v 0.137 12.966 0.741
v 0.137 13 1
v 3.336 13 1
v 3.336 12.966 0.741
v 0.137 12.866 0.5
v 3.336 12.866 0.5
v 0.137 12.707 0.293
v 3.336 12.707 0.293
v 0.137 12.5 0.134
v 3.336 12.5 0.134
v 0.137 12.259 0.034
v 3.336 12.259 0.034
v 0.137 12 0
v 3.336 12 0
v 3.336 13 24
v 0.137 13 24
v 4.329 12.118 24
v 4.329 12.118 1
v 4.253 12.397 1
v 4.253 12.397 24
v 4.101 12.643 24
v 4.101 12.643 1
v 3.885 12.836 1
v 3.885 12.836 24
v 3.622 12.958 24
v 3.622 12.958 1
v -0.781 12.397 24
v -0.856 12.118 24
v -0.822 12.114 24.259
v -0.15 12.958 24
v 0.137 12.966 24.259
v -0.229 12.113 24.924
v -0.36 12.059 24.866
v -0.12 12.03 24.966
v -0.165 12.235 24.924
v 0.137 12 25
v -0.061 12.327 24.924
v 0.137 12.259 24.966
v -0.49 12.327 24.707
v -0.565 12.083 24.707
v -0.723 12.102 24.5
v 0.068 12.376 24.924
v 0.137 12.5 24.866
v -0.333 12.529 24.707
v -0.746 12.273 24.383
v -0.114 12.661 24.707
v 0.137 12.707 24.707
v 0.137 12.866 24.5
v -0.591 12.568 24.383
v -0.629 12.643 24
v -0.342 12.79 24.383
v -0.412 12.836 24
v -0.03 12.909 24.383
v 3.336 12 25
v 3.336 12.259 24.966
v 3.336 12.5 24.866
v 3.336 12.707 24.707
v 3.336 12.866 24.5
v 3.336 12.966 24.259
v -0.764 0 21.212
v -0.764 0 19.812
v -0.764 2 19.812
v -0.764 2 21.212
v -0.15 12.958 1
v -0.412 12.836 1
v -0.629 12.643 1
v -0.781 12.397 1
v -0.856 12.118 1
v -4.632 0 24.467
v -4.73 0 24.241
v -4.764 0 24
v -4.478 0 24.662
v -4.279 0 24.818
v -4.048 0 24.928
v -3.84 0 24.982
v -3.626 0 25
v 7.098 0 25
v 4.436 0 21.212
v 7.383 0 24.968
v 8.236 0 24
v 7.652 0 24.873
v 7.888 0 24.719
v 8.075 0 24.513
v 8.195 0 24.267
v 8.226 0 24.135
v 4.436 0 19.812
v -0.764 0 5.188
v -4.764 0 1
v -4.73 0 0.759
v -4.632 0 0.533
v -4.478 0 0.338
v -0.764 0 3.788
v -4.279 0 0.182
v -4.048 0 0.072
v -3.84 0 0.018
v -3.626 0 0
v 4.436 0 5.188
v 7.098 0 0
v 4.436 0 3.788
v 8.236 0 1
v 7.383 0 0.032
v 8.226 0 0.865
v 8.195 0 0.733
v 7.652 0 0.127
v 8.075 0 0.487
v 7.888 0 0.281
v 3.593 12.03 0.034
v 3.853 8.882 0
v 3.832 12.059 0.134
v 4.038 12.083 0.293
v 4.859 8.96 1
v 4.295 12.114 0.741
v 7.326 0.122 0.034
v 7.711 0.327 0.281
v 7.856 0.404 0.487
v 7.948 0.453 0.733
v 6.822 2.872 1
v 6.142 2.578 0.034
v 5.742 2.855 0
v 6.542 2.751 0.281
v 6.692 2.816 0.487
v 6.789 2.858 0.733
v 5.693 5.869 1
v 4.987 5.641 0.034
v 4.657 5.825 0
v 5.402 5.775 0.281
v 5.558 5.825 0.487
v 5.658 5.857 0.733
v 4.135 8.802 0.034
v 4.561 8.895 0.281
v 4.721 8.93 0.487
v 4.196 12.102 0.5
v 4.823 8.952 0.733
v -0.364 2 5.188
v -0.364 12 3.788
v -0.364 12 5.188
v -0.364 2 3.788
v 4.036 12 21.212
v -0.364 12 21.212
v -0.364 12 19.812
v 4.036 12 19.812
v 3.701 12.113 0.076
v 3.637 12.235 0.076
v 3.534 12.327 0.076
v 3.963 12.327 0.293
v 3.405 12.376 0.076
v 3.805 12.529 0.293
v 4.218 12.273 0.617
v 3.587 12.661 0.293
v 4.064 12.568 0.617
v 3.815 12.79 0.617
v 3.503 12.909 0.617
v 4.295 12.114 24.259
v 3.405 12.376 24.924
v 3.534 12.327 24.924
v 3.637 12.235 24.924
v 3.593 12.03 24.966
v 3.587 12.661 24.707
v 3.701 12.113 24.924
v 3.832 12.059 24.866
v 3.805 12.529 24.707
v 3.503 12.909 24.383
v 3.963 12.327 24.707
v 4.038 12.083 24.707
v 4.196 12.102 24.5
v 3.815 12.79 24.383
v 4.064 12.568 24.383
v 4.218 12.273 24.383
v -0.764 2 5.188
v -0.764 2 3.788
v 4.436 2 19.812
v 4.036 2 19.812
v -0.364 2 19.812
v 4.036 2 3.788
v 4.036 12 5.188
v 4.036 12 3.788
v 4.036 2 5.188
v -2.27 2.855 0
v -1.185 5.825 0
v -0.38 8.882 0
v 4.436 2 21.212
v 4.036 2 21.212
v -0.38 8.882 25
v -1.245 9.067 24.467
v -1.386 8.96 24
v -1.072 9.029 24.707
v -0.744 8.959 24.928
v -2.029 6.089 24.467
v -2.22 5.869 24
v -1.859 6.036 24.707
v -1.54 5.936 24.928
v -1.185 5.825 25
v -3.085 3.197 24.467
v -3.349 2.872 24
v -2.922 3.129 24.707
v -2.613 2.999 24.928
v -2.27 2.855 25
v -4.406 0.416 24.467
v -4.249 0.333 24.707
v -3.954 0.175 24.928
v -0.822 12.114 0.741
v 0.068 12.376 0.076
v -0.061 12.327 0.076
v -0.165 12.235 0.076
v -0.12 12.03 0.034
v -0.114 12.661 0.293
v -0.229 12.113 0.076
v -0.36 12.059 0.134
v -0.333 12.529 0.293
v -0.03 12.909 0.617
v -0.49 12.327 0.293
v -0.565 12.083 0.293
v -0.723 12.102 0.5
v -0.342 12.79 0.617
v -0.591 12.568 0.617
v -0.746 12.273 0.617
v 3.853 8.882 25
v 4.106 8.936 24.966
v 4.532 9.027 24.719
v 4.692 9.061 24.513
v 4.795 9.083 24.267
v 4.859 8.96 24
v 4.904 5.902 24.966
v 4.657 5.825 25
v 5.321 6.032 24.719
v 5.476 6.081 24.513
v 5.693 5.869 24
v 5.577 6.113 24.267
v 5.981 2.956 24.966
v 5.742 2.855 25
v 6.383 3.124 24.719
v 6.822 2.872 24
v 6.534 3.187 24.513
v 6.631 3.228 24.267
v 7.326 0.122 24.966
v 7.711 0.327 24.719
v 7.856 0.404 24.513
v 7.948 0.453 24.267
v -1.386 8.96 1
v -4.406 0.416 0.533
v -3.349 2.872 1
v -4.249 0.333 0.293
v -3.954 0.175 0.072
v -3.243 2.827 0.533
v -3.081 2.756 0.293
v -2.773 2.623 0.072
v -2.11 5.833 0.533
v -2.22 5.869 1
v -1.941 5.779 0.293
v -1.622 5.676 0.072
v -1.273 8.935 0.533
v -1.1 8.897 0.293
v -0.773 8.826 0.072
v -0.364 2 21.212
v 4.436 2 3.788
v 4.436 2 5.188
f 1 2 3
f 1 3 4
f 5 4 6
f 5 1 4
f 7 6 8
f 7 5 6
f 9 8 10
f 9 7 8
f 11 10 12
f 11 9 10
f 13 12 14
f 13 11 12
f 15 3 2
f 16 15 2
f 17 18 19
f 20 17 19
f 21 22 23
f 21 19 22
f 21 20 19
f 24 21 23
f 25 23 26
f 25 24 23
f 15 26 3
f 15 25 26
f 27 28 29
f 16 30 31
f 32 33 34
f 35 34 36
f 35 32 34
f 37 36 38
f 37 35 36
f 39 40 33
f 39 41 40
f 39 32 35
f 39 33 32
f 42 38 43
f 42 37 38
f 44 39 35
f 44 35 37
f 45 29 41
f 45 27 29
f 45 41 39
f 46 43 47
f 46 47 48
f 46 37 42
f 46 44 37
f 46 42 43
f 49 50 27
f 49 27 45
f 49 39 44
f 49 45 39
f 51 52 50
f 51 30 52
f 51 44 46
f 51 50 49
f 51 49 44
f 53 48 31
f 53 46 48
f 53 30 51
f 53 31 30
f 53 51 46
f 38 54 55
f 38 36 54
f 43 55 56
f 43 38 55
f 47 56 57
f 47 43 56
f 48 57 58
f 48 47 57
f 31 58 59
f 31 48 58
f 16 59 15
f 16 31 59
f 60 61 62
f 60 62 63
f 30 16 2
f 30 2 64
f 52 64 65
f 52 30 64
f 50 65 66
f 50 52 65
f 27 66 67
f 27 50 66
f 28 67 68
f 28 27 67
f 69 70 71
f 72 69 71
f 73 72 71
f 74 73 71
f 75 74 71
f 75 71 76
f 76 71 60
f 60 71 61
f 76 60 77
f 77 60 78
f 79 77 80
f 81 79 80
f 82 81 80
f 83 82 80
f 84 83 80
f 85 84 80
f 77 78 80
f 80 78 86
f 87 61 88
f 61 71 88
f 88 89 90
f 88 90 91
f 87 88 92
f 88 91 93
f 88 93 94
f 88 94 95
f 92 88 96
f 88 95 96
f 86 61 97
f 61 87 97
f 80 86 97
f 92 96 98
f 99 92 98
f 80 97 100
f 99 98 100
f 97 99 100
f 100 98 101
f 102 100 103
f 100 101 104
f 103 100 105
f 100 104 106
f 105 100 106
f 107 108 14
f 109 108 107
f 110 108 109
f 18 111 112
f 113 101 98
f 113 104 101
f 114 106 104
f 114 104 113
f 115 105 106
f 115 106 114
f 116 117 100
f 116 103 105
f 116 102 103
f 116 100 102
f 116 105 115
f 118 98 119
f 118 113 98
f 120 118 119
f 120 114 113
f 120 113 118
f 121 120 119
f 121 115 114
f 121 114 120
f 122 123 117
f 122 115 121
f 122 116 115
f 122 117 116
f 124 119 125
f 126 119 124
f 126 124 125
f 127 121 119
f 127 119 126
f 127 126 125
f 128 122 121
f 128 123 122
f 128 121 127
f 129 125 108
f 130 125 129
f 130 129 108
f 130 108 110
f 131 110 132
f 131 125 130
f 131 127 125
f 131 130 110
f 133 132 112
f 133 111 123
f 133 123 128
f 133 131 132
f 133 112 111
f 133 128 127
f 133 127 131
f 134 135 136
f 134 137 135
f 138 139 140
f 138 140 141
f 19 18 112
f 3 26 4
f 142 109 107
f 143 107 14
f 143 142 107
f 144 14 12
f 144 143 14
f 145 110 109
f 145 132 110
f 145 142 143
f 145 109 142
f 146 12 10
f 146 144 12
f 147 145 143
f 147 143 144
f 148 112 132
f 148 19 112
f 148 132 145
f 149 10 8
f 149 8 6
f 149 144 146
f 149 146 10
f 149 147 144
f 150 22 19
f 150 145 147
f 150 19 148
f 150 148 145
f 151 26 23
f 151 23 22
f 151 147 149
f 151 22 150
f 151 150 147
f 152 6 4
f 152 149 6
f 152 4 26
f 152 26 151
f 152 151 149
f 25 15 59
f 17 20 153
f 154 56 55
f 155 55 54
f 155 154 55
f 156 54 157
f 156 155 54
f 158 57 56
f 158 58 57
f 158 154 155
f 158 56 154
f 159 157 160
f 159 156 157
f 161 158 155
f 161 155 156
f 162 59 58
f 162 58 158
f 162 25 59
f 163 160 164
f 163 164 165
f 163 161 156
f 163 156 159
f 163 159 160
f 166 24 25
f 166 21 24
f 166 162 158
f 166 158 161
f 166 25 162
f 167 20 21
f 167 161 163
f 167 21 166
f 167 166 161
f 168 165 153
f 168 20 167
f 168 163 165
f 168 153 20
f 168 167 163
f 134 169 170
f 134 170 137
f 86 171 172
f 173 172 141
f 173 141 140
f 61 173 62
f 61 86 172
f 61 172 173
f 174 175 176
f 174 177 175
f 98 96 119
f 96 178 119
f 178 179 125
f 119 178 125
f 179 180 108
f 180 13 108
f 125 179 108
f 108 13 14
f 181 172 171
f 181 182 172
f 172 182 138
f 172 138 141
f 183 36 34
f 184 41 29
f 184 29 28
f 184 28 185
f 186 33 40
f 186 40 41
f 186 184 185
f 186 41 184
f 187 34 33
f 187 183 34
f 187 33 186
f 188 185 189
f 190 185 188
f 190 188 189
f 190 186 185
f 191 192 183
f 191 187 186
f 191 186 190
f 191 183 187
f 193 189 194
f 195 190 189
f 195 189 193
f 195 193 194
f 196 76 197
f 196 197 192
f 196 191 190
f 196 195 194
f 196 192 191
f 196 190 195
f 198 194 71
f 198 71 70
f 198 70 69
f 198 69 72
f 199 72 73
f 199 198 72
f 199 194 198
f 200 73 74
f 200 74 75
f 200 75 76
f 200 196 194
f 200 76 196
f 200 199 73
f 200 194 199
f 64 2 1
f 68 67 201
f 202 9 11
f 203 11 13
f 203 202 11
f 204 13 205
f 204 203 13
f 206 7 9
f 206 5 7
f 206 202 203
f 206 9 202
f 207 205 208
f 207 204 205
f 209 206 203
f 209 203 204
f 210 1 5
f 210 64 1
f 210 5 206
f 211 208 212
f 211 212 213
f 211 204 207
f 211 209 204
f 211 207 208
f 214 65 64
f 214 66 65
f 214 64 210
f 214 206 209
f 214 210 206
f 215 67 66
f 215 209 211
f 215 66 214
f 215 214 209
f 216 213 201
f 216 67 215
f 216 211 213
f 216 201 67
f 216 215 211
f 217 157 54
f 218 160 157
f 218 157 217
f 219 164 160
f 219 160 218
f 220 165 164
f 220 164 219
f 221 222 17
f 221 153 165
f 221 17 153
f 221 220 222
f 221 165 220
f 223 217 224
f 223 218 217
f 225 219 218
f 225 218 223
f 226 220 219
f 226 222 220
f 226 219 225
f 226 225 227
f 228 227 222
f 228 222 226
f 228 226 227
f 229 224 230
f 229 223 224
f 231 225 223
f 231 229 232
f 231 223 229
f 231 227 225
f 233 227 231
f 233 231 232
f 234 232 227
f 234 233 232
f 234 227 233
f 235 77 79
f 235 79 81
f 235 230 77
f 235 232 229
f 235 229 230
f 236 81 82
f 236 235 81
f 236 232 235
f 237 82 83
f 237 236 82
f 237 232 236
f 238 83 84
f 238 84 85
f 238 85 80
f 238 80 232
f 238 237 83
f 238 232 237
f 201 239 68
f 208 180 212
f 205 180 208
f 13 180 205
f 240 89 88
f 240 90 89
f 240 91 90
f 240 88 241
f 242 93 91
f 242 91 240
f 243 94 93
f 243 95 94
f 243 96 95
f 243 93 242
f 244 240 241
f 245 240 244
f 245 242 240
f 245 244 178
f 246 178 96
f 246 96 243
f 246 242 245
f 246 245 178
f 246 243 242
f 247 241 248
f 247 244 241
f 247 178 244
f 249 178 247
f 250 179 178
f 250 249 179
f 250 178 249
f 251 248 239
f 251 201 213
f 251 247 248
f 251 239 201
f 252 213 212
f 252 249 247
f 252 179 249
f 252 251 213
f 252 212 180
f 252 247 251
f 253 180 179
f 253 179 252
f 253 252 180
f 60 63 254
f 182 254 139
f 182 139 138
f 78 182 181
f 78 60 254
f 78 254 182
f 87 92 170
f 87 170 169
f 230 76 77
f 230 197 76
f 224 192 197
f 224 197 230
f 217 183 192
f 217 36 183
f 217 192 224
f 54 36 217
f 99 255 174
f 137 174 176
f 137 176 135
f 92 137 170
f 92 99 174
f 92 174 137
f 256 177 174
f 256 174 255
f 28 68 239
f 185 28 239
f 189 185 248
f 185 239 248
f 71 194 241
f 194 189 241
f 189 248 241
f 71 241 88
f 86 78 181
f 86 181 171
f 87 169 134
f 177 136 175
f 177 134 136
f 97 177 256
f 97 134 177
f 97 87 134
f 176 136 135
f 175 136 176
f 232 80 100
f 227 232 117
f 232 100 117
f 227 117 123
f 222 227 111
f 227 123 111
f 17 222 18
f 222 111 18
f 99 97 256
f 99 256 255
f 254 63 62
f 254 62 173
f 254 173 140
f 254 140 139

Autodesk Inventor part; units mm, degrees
ref_plane "YZ Plane" through (0, 0, 0) normal (1, 0, 0) x (0, 1, 0)
ref_plane "XZ Plane" through (0, 0, 0) normal (0, 1, 0) x (-1, 0, 0)
ref_plane "XY Plane" through (0, 0, 0) normal (0, 0, 1) x (1, 0, 0)
sketch "Sketch1" plane through (0, 0, 0) normal (0, 0, 1) x (1, 0, 0)
  line L0 (-4.7637, 0) -> (8.2363, 0)
  line L1 (8.2363, 0) -> (8.2363, 13)
  line L2 (8.2363, 13) -> (-4.7637, 13)
  line L3 (-4.7637, 13) -> (-4.7637, 0)
  arc A0 (-4.7637, 0) -> (-0.7637, 13) centre (-33.6274, 15.9965) ccw
  arc A1 (4.2363, 13) -> (8.2363, 0) centre (37.1, 15.9965) ccw
  point P0 (0, 0)
  dimension "d0" = 13
  dimension "d1" = 13
  dimension "d2" = 4
  dimension "d3" = 4
  dimension "d4" = 33
  dimension "d5" = 33
extrude "Extrusion1" add sketch "Sketch1" along normal blind 25 contours A0 L2 A1 L0
sketch "Sketch2" plane through (-4.7637, 0, 0) normal (0, -1, 0) x (1, 0, 0)
  line L0 (4, 21.2125) -> (9.2, 21.2125)
  line L1 (9.2, 21.2125) -> (9.2, 19.8125)
  line L2 (9.2, 19.8125) -> (4, 19.8125)
  line L3 (4, 19.8125) -> (4, 21.2125)
  line L4 (4, 5.1875) -> (9.2, 5.1875)
  line L5 (9.2, 5.1875) -> (9.2, 3.7875)
  line L6 (9.2, 3.7875) -> (4, 3.7875)
  line L7 (4, 3.7875) -> (4, 5.1875)
  line L8 (0, 0) -> (0, 25) projected
  line L9 (0, 25) -> (13, 25) projected
  point P0 (4.7637, 0)
  dimension "d8" = 5.2
  dimension "d9" = 4
  dimension "d10" = 1.4
  dimension "d11" = 1.4
  dimension "d12" = 17.425
  dimension "d13" = 3.7875
extrude "Extrusion2" cut sketch "Sketch2" against normal blind 2
sketch "Sketch3" plane through (-4.7637, 2, 0) normal (0, -1, 0) x (1, 0, 0)
  line L0 (4.4, 21.2125) -> (8.8, 21.2125)
  line L1 (8.8, 21.2125) -> (8.8, 19.8125)
  line L2 (8.8, 19.8125) -> (4.4, 19.8125)
  line L3 (4.4, 19.8125) -> (4.4, 21.2125)
  line L4 (4, 19.8125) -> (4, 21.2125) projected
  line L5 (9.2, 21.2125) -> (9.2, 19.8125) projected
  line L6 (4, 21.2125) -> (9.2, 21.2125) projected
  line L7 (9.2, 19.8125) -> (4, 19.8125) projected
  line L8 (4, 5.1875) -> (9.2, 5.1875) projected
  line L9 (4, 3.7875) -> (4, 5.1875) projected
  line L10 (9.2, 3.7875) -> (4, 3.7875) projected
  line L11 (9.2, 5.1875) -> (9.2, 3.7875) projected
  line L12 (9.2, 3.7875) -> (4, 3.7875) projected
  line L13 (4.4, 5.1875) -> (8.8, 5.1875)
  line L14 (8.8, 5.1875) -> (8.8, 3.7875)
  line L15 (8.8, 3.7875) -> (4.4, 3.7875)
  line L16 (4.4, 3.7875) -> (4.4, 5.1875)
  point P0 (4.7637, 0)
  dimension "d16" = 0.4
  dimension "d17" = 0.4
  dimension "d18" = 0
  dimension "d19" = 0
extrude "Extrusion3" cut sketch "Sketch3" against normal blind 10 contours L0 L1 L2 L3 | L8 L14 L10 L16
fillet "Fillet1" radius 1 8 edges at (4.2363, 13, 12.5) (1.7363, 13, 25) (-0.7637, 13, 12.5) (1.7363, 13, 0) (5.5593, 6.2917, 25) (-2.0867, 6.2917, 25) (5.5593, 6.2917, 0) (-2.0867, 6.2917, 0)
properties part number "DoubleSliderCap-wide"
